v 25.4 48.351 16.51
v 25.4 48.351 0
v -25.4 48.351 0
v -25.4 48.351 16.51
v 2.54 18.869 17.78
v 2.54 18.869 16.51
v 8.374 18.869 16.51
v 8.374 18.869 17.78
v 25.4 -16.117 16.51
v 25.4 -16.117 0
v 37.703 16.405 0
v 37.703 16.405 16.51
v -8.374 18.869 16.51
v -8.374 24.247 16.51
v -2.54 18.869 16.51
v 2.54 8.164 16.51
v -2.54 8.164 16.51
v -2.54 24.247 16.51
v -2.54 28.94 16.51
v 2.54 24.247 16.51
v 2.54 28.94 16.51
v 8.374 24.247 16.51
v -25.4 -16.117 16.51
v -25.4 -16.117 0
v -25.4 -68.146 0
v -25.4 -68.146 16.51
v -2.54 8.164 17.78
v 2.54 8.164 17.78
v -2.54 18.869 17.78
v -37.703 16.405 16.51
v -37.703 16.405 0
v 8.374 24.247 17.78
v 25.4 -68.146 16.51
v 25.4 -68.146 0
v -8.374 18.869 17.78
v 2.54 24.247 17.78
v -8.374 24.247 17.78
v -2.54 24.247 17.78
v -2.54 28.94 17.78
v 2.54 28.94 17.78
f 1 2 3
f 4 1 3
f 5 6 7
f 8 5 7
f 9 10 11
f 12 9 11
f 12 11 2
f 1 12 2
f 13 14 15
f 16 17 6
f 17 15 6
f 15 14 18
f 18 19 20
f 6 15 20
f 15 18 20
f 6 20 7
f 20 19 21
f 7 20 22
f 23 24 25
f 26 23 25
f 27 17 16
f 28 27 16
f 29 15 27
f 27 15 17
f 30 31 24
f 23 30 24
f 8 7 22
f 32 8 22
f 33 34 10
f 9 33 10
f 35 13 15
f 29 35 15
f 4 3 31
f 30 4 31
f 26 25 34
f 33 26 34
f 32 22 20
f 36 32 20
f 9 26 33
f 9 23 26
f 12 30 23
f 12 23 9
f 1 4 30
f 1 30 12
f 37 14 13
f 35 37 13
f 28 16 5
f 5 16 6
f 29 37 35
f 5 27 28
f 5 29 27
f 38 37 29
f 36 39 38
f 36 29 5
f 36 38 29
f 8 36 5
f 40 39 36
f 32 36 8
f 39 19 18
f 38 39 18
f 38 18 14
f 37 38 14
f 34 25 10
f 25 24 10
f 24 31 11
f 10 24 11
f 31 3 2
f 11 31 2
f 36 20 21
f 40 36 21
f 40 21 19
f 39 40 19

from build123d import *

# Parameters (mm, degrees)
F1_DEPTH = 16.51
F3_DEPTH = 1.27


with BuildPart() as f1:
    # F0 (on Top) → F1 (new body)
    with BuildSketch(Plane.XY):
        Polygon((-25.4, -68.146345), (0, -68.146345), (25.4, -68.146345), (25.4, -16.117122), (37.702557, 16.404929), (25.4, 48.351366), (-25.4, 48.351366), (-37.702557, 16.404929), (-25.4, -16.117122), align=None)
    extrude(amount=F1_DEPTH)


with BuildPart() as f3:
    # F2 (on face) → F3 (new body)
    with BuildSketch(Plane.XY.offset(16.51)):
        Polygon((-2.54, 8.164284), (0, 8.164284), (2.54, 8.164284), (2.54, 18.868566), (8.37418, 18.868566), (8.37418, 24.247402), (2.54, 24.247402), (2.54, 28.940339), (-2.54, 28.940339), (-2.54, 24.247402), (-8.37418, 24.247402), (-8.37418, 18.868566), (-2.54, 18.868566), align=None)
    extrude(amount=F3_DEPTH)


solid = Compound([f1.part, f3.part])
